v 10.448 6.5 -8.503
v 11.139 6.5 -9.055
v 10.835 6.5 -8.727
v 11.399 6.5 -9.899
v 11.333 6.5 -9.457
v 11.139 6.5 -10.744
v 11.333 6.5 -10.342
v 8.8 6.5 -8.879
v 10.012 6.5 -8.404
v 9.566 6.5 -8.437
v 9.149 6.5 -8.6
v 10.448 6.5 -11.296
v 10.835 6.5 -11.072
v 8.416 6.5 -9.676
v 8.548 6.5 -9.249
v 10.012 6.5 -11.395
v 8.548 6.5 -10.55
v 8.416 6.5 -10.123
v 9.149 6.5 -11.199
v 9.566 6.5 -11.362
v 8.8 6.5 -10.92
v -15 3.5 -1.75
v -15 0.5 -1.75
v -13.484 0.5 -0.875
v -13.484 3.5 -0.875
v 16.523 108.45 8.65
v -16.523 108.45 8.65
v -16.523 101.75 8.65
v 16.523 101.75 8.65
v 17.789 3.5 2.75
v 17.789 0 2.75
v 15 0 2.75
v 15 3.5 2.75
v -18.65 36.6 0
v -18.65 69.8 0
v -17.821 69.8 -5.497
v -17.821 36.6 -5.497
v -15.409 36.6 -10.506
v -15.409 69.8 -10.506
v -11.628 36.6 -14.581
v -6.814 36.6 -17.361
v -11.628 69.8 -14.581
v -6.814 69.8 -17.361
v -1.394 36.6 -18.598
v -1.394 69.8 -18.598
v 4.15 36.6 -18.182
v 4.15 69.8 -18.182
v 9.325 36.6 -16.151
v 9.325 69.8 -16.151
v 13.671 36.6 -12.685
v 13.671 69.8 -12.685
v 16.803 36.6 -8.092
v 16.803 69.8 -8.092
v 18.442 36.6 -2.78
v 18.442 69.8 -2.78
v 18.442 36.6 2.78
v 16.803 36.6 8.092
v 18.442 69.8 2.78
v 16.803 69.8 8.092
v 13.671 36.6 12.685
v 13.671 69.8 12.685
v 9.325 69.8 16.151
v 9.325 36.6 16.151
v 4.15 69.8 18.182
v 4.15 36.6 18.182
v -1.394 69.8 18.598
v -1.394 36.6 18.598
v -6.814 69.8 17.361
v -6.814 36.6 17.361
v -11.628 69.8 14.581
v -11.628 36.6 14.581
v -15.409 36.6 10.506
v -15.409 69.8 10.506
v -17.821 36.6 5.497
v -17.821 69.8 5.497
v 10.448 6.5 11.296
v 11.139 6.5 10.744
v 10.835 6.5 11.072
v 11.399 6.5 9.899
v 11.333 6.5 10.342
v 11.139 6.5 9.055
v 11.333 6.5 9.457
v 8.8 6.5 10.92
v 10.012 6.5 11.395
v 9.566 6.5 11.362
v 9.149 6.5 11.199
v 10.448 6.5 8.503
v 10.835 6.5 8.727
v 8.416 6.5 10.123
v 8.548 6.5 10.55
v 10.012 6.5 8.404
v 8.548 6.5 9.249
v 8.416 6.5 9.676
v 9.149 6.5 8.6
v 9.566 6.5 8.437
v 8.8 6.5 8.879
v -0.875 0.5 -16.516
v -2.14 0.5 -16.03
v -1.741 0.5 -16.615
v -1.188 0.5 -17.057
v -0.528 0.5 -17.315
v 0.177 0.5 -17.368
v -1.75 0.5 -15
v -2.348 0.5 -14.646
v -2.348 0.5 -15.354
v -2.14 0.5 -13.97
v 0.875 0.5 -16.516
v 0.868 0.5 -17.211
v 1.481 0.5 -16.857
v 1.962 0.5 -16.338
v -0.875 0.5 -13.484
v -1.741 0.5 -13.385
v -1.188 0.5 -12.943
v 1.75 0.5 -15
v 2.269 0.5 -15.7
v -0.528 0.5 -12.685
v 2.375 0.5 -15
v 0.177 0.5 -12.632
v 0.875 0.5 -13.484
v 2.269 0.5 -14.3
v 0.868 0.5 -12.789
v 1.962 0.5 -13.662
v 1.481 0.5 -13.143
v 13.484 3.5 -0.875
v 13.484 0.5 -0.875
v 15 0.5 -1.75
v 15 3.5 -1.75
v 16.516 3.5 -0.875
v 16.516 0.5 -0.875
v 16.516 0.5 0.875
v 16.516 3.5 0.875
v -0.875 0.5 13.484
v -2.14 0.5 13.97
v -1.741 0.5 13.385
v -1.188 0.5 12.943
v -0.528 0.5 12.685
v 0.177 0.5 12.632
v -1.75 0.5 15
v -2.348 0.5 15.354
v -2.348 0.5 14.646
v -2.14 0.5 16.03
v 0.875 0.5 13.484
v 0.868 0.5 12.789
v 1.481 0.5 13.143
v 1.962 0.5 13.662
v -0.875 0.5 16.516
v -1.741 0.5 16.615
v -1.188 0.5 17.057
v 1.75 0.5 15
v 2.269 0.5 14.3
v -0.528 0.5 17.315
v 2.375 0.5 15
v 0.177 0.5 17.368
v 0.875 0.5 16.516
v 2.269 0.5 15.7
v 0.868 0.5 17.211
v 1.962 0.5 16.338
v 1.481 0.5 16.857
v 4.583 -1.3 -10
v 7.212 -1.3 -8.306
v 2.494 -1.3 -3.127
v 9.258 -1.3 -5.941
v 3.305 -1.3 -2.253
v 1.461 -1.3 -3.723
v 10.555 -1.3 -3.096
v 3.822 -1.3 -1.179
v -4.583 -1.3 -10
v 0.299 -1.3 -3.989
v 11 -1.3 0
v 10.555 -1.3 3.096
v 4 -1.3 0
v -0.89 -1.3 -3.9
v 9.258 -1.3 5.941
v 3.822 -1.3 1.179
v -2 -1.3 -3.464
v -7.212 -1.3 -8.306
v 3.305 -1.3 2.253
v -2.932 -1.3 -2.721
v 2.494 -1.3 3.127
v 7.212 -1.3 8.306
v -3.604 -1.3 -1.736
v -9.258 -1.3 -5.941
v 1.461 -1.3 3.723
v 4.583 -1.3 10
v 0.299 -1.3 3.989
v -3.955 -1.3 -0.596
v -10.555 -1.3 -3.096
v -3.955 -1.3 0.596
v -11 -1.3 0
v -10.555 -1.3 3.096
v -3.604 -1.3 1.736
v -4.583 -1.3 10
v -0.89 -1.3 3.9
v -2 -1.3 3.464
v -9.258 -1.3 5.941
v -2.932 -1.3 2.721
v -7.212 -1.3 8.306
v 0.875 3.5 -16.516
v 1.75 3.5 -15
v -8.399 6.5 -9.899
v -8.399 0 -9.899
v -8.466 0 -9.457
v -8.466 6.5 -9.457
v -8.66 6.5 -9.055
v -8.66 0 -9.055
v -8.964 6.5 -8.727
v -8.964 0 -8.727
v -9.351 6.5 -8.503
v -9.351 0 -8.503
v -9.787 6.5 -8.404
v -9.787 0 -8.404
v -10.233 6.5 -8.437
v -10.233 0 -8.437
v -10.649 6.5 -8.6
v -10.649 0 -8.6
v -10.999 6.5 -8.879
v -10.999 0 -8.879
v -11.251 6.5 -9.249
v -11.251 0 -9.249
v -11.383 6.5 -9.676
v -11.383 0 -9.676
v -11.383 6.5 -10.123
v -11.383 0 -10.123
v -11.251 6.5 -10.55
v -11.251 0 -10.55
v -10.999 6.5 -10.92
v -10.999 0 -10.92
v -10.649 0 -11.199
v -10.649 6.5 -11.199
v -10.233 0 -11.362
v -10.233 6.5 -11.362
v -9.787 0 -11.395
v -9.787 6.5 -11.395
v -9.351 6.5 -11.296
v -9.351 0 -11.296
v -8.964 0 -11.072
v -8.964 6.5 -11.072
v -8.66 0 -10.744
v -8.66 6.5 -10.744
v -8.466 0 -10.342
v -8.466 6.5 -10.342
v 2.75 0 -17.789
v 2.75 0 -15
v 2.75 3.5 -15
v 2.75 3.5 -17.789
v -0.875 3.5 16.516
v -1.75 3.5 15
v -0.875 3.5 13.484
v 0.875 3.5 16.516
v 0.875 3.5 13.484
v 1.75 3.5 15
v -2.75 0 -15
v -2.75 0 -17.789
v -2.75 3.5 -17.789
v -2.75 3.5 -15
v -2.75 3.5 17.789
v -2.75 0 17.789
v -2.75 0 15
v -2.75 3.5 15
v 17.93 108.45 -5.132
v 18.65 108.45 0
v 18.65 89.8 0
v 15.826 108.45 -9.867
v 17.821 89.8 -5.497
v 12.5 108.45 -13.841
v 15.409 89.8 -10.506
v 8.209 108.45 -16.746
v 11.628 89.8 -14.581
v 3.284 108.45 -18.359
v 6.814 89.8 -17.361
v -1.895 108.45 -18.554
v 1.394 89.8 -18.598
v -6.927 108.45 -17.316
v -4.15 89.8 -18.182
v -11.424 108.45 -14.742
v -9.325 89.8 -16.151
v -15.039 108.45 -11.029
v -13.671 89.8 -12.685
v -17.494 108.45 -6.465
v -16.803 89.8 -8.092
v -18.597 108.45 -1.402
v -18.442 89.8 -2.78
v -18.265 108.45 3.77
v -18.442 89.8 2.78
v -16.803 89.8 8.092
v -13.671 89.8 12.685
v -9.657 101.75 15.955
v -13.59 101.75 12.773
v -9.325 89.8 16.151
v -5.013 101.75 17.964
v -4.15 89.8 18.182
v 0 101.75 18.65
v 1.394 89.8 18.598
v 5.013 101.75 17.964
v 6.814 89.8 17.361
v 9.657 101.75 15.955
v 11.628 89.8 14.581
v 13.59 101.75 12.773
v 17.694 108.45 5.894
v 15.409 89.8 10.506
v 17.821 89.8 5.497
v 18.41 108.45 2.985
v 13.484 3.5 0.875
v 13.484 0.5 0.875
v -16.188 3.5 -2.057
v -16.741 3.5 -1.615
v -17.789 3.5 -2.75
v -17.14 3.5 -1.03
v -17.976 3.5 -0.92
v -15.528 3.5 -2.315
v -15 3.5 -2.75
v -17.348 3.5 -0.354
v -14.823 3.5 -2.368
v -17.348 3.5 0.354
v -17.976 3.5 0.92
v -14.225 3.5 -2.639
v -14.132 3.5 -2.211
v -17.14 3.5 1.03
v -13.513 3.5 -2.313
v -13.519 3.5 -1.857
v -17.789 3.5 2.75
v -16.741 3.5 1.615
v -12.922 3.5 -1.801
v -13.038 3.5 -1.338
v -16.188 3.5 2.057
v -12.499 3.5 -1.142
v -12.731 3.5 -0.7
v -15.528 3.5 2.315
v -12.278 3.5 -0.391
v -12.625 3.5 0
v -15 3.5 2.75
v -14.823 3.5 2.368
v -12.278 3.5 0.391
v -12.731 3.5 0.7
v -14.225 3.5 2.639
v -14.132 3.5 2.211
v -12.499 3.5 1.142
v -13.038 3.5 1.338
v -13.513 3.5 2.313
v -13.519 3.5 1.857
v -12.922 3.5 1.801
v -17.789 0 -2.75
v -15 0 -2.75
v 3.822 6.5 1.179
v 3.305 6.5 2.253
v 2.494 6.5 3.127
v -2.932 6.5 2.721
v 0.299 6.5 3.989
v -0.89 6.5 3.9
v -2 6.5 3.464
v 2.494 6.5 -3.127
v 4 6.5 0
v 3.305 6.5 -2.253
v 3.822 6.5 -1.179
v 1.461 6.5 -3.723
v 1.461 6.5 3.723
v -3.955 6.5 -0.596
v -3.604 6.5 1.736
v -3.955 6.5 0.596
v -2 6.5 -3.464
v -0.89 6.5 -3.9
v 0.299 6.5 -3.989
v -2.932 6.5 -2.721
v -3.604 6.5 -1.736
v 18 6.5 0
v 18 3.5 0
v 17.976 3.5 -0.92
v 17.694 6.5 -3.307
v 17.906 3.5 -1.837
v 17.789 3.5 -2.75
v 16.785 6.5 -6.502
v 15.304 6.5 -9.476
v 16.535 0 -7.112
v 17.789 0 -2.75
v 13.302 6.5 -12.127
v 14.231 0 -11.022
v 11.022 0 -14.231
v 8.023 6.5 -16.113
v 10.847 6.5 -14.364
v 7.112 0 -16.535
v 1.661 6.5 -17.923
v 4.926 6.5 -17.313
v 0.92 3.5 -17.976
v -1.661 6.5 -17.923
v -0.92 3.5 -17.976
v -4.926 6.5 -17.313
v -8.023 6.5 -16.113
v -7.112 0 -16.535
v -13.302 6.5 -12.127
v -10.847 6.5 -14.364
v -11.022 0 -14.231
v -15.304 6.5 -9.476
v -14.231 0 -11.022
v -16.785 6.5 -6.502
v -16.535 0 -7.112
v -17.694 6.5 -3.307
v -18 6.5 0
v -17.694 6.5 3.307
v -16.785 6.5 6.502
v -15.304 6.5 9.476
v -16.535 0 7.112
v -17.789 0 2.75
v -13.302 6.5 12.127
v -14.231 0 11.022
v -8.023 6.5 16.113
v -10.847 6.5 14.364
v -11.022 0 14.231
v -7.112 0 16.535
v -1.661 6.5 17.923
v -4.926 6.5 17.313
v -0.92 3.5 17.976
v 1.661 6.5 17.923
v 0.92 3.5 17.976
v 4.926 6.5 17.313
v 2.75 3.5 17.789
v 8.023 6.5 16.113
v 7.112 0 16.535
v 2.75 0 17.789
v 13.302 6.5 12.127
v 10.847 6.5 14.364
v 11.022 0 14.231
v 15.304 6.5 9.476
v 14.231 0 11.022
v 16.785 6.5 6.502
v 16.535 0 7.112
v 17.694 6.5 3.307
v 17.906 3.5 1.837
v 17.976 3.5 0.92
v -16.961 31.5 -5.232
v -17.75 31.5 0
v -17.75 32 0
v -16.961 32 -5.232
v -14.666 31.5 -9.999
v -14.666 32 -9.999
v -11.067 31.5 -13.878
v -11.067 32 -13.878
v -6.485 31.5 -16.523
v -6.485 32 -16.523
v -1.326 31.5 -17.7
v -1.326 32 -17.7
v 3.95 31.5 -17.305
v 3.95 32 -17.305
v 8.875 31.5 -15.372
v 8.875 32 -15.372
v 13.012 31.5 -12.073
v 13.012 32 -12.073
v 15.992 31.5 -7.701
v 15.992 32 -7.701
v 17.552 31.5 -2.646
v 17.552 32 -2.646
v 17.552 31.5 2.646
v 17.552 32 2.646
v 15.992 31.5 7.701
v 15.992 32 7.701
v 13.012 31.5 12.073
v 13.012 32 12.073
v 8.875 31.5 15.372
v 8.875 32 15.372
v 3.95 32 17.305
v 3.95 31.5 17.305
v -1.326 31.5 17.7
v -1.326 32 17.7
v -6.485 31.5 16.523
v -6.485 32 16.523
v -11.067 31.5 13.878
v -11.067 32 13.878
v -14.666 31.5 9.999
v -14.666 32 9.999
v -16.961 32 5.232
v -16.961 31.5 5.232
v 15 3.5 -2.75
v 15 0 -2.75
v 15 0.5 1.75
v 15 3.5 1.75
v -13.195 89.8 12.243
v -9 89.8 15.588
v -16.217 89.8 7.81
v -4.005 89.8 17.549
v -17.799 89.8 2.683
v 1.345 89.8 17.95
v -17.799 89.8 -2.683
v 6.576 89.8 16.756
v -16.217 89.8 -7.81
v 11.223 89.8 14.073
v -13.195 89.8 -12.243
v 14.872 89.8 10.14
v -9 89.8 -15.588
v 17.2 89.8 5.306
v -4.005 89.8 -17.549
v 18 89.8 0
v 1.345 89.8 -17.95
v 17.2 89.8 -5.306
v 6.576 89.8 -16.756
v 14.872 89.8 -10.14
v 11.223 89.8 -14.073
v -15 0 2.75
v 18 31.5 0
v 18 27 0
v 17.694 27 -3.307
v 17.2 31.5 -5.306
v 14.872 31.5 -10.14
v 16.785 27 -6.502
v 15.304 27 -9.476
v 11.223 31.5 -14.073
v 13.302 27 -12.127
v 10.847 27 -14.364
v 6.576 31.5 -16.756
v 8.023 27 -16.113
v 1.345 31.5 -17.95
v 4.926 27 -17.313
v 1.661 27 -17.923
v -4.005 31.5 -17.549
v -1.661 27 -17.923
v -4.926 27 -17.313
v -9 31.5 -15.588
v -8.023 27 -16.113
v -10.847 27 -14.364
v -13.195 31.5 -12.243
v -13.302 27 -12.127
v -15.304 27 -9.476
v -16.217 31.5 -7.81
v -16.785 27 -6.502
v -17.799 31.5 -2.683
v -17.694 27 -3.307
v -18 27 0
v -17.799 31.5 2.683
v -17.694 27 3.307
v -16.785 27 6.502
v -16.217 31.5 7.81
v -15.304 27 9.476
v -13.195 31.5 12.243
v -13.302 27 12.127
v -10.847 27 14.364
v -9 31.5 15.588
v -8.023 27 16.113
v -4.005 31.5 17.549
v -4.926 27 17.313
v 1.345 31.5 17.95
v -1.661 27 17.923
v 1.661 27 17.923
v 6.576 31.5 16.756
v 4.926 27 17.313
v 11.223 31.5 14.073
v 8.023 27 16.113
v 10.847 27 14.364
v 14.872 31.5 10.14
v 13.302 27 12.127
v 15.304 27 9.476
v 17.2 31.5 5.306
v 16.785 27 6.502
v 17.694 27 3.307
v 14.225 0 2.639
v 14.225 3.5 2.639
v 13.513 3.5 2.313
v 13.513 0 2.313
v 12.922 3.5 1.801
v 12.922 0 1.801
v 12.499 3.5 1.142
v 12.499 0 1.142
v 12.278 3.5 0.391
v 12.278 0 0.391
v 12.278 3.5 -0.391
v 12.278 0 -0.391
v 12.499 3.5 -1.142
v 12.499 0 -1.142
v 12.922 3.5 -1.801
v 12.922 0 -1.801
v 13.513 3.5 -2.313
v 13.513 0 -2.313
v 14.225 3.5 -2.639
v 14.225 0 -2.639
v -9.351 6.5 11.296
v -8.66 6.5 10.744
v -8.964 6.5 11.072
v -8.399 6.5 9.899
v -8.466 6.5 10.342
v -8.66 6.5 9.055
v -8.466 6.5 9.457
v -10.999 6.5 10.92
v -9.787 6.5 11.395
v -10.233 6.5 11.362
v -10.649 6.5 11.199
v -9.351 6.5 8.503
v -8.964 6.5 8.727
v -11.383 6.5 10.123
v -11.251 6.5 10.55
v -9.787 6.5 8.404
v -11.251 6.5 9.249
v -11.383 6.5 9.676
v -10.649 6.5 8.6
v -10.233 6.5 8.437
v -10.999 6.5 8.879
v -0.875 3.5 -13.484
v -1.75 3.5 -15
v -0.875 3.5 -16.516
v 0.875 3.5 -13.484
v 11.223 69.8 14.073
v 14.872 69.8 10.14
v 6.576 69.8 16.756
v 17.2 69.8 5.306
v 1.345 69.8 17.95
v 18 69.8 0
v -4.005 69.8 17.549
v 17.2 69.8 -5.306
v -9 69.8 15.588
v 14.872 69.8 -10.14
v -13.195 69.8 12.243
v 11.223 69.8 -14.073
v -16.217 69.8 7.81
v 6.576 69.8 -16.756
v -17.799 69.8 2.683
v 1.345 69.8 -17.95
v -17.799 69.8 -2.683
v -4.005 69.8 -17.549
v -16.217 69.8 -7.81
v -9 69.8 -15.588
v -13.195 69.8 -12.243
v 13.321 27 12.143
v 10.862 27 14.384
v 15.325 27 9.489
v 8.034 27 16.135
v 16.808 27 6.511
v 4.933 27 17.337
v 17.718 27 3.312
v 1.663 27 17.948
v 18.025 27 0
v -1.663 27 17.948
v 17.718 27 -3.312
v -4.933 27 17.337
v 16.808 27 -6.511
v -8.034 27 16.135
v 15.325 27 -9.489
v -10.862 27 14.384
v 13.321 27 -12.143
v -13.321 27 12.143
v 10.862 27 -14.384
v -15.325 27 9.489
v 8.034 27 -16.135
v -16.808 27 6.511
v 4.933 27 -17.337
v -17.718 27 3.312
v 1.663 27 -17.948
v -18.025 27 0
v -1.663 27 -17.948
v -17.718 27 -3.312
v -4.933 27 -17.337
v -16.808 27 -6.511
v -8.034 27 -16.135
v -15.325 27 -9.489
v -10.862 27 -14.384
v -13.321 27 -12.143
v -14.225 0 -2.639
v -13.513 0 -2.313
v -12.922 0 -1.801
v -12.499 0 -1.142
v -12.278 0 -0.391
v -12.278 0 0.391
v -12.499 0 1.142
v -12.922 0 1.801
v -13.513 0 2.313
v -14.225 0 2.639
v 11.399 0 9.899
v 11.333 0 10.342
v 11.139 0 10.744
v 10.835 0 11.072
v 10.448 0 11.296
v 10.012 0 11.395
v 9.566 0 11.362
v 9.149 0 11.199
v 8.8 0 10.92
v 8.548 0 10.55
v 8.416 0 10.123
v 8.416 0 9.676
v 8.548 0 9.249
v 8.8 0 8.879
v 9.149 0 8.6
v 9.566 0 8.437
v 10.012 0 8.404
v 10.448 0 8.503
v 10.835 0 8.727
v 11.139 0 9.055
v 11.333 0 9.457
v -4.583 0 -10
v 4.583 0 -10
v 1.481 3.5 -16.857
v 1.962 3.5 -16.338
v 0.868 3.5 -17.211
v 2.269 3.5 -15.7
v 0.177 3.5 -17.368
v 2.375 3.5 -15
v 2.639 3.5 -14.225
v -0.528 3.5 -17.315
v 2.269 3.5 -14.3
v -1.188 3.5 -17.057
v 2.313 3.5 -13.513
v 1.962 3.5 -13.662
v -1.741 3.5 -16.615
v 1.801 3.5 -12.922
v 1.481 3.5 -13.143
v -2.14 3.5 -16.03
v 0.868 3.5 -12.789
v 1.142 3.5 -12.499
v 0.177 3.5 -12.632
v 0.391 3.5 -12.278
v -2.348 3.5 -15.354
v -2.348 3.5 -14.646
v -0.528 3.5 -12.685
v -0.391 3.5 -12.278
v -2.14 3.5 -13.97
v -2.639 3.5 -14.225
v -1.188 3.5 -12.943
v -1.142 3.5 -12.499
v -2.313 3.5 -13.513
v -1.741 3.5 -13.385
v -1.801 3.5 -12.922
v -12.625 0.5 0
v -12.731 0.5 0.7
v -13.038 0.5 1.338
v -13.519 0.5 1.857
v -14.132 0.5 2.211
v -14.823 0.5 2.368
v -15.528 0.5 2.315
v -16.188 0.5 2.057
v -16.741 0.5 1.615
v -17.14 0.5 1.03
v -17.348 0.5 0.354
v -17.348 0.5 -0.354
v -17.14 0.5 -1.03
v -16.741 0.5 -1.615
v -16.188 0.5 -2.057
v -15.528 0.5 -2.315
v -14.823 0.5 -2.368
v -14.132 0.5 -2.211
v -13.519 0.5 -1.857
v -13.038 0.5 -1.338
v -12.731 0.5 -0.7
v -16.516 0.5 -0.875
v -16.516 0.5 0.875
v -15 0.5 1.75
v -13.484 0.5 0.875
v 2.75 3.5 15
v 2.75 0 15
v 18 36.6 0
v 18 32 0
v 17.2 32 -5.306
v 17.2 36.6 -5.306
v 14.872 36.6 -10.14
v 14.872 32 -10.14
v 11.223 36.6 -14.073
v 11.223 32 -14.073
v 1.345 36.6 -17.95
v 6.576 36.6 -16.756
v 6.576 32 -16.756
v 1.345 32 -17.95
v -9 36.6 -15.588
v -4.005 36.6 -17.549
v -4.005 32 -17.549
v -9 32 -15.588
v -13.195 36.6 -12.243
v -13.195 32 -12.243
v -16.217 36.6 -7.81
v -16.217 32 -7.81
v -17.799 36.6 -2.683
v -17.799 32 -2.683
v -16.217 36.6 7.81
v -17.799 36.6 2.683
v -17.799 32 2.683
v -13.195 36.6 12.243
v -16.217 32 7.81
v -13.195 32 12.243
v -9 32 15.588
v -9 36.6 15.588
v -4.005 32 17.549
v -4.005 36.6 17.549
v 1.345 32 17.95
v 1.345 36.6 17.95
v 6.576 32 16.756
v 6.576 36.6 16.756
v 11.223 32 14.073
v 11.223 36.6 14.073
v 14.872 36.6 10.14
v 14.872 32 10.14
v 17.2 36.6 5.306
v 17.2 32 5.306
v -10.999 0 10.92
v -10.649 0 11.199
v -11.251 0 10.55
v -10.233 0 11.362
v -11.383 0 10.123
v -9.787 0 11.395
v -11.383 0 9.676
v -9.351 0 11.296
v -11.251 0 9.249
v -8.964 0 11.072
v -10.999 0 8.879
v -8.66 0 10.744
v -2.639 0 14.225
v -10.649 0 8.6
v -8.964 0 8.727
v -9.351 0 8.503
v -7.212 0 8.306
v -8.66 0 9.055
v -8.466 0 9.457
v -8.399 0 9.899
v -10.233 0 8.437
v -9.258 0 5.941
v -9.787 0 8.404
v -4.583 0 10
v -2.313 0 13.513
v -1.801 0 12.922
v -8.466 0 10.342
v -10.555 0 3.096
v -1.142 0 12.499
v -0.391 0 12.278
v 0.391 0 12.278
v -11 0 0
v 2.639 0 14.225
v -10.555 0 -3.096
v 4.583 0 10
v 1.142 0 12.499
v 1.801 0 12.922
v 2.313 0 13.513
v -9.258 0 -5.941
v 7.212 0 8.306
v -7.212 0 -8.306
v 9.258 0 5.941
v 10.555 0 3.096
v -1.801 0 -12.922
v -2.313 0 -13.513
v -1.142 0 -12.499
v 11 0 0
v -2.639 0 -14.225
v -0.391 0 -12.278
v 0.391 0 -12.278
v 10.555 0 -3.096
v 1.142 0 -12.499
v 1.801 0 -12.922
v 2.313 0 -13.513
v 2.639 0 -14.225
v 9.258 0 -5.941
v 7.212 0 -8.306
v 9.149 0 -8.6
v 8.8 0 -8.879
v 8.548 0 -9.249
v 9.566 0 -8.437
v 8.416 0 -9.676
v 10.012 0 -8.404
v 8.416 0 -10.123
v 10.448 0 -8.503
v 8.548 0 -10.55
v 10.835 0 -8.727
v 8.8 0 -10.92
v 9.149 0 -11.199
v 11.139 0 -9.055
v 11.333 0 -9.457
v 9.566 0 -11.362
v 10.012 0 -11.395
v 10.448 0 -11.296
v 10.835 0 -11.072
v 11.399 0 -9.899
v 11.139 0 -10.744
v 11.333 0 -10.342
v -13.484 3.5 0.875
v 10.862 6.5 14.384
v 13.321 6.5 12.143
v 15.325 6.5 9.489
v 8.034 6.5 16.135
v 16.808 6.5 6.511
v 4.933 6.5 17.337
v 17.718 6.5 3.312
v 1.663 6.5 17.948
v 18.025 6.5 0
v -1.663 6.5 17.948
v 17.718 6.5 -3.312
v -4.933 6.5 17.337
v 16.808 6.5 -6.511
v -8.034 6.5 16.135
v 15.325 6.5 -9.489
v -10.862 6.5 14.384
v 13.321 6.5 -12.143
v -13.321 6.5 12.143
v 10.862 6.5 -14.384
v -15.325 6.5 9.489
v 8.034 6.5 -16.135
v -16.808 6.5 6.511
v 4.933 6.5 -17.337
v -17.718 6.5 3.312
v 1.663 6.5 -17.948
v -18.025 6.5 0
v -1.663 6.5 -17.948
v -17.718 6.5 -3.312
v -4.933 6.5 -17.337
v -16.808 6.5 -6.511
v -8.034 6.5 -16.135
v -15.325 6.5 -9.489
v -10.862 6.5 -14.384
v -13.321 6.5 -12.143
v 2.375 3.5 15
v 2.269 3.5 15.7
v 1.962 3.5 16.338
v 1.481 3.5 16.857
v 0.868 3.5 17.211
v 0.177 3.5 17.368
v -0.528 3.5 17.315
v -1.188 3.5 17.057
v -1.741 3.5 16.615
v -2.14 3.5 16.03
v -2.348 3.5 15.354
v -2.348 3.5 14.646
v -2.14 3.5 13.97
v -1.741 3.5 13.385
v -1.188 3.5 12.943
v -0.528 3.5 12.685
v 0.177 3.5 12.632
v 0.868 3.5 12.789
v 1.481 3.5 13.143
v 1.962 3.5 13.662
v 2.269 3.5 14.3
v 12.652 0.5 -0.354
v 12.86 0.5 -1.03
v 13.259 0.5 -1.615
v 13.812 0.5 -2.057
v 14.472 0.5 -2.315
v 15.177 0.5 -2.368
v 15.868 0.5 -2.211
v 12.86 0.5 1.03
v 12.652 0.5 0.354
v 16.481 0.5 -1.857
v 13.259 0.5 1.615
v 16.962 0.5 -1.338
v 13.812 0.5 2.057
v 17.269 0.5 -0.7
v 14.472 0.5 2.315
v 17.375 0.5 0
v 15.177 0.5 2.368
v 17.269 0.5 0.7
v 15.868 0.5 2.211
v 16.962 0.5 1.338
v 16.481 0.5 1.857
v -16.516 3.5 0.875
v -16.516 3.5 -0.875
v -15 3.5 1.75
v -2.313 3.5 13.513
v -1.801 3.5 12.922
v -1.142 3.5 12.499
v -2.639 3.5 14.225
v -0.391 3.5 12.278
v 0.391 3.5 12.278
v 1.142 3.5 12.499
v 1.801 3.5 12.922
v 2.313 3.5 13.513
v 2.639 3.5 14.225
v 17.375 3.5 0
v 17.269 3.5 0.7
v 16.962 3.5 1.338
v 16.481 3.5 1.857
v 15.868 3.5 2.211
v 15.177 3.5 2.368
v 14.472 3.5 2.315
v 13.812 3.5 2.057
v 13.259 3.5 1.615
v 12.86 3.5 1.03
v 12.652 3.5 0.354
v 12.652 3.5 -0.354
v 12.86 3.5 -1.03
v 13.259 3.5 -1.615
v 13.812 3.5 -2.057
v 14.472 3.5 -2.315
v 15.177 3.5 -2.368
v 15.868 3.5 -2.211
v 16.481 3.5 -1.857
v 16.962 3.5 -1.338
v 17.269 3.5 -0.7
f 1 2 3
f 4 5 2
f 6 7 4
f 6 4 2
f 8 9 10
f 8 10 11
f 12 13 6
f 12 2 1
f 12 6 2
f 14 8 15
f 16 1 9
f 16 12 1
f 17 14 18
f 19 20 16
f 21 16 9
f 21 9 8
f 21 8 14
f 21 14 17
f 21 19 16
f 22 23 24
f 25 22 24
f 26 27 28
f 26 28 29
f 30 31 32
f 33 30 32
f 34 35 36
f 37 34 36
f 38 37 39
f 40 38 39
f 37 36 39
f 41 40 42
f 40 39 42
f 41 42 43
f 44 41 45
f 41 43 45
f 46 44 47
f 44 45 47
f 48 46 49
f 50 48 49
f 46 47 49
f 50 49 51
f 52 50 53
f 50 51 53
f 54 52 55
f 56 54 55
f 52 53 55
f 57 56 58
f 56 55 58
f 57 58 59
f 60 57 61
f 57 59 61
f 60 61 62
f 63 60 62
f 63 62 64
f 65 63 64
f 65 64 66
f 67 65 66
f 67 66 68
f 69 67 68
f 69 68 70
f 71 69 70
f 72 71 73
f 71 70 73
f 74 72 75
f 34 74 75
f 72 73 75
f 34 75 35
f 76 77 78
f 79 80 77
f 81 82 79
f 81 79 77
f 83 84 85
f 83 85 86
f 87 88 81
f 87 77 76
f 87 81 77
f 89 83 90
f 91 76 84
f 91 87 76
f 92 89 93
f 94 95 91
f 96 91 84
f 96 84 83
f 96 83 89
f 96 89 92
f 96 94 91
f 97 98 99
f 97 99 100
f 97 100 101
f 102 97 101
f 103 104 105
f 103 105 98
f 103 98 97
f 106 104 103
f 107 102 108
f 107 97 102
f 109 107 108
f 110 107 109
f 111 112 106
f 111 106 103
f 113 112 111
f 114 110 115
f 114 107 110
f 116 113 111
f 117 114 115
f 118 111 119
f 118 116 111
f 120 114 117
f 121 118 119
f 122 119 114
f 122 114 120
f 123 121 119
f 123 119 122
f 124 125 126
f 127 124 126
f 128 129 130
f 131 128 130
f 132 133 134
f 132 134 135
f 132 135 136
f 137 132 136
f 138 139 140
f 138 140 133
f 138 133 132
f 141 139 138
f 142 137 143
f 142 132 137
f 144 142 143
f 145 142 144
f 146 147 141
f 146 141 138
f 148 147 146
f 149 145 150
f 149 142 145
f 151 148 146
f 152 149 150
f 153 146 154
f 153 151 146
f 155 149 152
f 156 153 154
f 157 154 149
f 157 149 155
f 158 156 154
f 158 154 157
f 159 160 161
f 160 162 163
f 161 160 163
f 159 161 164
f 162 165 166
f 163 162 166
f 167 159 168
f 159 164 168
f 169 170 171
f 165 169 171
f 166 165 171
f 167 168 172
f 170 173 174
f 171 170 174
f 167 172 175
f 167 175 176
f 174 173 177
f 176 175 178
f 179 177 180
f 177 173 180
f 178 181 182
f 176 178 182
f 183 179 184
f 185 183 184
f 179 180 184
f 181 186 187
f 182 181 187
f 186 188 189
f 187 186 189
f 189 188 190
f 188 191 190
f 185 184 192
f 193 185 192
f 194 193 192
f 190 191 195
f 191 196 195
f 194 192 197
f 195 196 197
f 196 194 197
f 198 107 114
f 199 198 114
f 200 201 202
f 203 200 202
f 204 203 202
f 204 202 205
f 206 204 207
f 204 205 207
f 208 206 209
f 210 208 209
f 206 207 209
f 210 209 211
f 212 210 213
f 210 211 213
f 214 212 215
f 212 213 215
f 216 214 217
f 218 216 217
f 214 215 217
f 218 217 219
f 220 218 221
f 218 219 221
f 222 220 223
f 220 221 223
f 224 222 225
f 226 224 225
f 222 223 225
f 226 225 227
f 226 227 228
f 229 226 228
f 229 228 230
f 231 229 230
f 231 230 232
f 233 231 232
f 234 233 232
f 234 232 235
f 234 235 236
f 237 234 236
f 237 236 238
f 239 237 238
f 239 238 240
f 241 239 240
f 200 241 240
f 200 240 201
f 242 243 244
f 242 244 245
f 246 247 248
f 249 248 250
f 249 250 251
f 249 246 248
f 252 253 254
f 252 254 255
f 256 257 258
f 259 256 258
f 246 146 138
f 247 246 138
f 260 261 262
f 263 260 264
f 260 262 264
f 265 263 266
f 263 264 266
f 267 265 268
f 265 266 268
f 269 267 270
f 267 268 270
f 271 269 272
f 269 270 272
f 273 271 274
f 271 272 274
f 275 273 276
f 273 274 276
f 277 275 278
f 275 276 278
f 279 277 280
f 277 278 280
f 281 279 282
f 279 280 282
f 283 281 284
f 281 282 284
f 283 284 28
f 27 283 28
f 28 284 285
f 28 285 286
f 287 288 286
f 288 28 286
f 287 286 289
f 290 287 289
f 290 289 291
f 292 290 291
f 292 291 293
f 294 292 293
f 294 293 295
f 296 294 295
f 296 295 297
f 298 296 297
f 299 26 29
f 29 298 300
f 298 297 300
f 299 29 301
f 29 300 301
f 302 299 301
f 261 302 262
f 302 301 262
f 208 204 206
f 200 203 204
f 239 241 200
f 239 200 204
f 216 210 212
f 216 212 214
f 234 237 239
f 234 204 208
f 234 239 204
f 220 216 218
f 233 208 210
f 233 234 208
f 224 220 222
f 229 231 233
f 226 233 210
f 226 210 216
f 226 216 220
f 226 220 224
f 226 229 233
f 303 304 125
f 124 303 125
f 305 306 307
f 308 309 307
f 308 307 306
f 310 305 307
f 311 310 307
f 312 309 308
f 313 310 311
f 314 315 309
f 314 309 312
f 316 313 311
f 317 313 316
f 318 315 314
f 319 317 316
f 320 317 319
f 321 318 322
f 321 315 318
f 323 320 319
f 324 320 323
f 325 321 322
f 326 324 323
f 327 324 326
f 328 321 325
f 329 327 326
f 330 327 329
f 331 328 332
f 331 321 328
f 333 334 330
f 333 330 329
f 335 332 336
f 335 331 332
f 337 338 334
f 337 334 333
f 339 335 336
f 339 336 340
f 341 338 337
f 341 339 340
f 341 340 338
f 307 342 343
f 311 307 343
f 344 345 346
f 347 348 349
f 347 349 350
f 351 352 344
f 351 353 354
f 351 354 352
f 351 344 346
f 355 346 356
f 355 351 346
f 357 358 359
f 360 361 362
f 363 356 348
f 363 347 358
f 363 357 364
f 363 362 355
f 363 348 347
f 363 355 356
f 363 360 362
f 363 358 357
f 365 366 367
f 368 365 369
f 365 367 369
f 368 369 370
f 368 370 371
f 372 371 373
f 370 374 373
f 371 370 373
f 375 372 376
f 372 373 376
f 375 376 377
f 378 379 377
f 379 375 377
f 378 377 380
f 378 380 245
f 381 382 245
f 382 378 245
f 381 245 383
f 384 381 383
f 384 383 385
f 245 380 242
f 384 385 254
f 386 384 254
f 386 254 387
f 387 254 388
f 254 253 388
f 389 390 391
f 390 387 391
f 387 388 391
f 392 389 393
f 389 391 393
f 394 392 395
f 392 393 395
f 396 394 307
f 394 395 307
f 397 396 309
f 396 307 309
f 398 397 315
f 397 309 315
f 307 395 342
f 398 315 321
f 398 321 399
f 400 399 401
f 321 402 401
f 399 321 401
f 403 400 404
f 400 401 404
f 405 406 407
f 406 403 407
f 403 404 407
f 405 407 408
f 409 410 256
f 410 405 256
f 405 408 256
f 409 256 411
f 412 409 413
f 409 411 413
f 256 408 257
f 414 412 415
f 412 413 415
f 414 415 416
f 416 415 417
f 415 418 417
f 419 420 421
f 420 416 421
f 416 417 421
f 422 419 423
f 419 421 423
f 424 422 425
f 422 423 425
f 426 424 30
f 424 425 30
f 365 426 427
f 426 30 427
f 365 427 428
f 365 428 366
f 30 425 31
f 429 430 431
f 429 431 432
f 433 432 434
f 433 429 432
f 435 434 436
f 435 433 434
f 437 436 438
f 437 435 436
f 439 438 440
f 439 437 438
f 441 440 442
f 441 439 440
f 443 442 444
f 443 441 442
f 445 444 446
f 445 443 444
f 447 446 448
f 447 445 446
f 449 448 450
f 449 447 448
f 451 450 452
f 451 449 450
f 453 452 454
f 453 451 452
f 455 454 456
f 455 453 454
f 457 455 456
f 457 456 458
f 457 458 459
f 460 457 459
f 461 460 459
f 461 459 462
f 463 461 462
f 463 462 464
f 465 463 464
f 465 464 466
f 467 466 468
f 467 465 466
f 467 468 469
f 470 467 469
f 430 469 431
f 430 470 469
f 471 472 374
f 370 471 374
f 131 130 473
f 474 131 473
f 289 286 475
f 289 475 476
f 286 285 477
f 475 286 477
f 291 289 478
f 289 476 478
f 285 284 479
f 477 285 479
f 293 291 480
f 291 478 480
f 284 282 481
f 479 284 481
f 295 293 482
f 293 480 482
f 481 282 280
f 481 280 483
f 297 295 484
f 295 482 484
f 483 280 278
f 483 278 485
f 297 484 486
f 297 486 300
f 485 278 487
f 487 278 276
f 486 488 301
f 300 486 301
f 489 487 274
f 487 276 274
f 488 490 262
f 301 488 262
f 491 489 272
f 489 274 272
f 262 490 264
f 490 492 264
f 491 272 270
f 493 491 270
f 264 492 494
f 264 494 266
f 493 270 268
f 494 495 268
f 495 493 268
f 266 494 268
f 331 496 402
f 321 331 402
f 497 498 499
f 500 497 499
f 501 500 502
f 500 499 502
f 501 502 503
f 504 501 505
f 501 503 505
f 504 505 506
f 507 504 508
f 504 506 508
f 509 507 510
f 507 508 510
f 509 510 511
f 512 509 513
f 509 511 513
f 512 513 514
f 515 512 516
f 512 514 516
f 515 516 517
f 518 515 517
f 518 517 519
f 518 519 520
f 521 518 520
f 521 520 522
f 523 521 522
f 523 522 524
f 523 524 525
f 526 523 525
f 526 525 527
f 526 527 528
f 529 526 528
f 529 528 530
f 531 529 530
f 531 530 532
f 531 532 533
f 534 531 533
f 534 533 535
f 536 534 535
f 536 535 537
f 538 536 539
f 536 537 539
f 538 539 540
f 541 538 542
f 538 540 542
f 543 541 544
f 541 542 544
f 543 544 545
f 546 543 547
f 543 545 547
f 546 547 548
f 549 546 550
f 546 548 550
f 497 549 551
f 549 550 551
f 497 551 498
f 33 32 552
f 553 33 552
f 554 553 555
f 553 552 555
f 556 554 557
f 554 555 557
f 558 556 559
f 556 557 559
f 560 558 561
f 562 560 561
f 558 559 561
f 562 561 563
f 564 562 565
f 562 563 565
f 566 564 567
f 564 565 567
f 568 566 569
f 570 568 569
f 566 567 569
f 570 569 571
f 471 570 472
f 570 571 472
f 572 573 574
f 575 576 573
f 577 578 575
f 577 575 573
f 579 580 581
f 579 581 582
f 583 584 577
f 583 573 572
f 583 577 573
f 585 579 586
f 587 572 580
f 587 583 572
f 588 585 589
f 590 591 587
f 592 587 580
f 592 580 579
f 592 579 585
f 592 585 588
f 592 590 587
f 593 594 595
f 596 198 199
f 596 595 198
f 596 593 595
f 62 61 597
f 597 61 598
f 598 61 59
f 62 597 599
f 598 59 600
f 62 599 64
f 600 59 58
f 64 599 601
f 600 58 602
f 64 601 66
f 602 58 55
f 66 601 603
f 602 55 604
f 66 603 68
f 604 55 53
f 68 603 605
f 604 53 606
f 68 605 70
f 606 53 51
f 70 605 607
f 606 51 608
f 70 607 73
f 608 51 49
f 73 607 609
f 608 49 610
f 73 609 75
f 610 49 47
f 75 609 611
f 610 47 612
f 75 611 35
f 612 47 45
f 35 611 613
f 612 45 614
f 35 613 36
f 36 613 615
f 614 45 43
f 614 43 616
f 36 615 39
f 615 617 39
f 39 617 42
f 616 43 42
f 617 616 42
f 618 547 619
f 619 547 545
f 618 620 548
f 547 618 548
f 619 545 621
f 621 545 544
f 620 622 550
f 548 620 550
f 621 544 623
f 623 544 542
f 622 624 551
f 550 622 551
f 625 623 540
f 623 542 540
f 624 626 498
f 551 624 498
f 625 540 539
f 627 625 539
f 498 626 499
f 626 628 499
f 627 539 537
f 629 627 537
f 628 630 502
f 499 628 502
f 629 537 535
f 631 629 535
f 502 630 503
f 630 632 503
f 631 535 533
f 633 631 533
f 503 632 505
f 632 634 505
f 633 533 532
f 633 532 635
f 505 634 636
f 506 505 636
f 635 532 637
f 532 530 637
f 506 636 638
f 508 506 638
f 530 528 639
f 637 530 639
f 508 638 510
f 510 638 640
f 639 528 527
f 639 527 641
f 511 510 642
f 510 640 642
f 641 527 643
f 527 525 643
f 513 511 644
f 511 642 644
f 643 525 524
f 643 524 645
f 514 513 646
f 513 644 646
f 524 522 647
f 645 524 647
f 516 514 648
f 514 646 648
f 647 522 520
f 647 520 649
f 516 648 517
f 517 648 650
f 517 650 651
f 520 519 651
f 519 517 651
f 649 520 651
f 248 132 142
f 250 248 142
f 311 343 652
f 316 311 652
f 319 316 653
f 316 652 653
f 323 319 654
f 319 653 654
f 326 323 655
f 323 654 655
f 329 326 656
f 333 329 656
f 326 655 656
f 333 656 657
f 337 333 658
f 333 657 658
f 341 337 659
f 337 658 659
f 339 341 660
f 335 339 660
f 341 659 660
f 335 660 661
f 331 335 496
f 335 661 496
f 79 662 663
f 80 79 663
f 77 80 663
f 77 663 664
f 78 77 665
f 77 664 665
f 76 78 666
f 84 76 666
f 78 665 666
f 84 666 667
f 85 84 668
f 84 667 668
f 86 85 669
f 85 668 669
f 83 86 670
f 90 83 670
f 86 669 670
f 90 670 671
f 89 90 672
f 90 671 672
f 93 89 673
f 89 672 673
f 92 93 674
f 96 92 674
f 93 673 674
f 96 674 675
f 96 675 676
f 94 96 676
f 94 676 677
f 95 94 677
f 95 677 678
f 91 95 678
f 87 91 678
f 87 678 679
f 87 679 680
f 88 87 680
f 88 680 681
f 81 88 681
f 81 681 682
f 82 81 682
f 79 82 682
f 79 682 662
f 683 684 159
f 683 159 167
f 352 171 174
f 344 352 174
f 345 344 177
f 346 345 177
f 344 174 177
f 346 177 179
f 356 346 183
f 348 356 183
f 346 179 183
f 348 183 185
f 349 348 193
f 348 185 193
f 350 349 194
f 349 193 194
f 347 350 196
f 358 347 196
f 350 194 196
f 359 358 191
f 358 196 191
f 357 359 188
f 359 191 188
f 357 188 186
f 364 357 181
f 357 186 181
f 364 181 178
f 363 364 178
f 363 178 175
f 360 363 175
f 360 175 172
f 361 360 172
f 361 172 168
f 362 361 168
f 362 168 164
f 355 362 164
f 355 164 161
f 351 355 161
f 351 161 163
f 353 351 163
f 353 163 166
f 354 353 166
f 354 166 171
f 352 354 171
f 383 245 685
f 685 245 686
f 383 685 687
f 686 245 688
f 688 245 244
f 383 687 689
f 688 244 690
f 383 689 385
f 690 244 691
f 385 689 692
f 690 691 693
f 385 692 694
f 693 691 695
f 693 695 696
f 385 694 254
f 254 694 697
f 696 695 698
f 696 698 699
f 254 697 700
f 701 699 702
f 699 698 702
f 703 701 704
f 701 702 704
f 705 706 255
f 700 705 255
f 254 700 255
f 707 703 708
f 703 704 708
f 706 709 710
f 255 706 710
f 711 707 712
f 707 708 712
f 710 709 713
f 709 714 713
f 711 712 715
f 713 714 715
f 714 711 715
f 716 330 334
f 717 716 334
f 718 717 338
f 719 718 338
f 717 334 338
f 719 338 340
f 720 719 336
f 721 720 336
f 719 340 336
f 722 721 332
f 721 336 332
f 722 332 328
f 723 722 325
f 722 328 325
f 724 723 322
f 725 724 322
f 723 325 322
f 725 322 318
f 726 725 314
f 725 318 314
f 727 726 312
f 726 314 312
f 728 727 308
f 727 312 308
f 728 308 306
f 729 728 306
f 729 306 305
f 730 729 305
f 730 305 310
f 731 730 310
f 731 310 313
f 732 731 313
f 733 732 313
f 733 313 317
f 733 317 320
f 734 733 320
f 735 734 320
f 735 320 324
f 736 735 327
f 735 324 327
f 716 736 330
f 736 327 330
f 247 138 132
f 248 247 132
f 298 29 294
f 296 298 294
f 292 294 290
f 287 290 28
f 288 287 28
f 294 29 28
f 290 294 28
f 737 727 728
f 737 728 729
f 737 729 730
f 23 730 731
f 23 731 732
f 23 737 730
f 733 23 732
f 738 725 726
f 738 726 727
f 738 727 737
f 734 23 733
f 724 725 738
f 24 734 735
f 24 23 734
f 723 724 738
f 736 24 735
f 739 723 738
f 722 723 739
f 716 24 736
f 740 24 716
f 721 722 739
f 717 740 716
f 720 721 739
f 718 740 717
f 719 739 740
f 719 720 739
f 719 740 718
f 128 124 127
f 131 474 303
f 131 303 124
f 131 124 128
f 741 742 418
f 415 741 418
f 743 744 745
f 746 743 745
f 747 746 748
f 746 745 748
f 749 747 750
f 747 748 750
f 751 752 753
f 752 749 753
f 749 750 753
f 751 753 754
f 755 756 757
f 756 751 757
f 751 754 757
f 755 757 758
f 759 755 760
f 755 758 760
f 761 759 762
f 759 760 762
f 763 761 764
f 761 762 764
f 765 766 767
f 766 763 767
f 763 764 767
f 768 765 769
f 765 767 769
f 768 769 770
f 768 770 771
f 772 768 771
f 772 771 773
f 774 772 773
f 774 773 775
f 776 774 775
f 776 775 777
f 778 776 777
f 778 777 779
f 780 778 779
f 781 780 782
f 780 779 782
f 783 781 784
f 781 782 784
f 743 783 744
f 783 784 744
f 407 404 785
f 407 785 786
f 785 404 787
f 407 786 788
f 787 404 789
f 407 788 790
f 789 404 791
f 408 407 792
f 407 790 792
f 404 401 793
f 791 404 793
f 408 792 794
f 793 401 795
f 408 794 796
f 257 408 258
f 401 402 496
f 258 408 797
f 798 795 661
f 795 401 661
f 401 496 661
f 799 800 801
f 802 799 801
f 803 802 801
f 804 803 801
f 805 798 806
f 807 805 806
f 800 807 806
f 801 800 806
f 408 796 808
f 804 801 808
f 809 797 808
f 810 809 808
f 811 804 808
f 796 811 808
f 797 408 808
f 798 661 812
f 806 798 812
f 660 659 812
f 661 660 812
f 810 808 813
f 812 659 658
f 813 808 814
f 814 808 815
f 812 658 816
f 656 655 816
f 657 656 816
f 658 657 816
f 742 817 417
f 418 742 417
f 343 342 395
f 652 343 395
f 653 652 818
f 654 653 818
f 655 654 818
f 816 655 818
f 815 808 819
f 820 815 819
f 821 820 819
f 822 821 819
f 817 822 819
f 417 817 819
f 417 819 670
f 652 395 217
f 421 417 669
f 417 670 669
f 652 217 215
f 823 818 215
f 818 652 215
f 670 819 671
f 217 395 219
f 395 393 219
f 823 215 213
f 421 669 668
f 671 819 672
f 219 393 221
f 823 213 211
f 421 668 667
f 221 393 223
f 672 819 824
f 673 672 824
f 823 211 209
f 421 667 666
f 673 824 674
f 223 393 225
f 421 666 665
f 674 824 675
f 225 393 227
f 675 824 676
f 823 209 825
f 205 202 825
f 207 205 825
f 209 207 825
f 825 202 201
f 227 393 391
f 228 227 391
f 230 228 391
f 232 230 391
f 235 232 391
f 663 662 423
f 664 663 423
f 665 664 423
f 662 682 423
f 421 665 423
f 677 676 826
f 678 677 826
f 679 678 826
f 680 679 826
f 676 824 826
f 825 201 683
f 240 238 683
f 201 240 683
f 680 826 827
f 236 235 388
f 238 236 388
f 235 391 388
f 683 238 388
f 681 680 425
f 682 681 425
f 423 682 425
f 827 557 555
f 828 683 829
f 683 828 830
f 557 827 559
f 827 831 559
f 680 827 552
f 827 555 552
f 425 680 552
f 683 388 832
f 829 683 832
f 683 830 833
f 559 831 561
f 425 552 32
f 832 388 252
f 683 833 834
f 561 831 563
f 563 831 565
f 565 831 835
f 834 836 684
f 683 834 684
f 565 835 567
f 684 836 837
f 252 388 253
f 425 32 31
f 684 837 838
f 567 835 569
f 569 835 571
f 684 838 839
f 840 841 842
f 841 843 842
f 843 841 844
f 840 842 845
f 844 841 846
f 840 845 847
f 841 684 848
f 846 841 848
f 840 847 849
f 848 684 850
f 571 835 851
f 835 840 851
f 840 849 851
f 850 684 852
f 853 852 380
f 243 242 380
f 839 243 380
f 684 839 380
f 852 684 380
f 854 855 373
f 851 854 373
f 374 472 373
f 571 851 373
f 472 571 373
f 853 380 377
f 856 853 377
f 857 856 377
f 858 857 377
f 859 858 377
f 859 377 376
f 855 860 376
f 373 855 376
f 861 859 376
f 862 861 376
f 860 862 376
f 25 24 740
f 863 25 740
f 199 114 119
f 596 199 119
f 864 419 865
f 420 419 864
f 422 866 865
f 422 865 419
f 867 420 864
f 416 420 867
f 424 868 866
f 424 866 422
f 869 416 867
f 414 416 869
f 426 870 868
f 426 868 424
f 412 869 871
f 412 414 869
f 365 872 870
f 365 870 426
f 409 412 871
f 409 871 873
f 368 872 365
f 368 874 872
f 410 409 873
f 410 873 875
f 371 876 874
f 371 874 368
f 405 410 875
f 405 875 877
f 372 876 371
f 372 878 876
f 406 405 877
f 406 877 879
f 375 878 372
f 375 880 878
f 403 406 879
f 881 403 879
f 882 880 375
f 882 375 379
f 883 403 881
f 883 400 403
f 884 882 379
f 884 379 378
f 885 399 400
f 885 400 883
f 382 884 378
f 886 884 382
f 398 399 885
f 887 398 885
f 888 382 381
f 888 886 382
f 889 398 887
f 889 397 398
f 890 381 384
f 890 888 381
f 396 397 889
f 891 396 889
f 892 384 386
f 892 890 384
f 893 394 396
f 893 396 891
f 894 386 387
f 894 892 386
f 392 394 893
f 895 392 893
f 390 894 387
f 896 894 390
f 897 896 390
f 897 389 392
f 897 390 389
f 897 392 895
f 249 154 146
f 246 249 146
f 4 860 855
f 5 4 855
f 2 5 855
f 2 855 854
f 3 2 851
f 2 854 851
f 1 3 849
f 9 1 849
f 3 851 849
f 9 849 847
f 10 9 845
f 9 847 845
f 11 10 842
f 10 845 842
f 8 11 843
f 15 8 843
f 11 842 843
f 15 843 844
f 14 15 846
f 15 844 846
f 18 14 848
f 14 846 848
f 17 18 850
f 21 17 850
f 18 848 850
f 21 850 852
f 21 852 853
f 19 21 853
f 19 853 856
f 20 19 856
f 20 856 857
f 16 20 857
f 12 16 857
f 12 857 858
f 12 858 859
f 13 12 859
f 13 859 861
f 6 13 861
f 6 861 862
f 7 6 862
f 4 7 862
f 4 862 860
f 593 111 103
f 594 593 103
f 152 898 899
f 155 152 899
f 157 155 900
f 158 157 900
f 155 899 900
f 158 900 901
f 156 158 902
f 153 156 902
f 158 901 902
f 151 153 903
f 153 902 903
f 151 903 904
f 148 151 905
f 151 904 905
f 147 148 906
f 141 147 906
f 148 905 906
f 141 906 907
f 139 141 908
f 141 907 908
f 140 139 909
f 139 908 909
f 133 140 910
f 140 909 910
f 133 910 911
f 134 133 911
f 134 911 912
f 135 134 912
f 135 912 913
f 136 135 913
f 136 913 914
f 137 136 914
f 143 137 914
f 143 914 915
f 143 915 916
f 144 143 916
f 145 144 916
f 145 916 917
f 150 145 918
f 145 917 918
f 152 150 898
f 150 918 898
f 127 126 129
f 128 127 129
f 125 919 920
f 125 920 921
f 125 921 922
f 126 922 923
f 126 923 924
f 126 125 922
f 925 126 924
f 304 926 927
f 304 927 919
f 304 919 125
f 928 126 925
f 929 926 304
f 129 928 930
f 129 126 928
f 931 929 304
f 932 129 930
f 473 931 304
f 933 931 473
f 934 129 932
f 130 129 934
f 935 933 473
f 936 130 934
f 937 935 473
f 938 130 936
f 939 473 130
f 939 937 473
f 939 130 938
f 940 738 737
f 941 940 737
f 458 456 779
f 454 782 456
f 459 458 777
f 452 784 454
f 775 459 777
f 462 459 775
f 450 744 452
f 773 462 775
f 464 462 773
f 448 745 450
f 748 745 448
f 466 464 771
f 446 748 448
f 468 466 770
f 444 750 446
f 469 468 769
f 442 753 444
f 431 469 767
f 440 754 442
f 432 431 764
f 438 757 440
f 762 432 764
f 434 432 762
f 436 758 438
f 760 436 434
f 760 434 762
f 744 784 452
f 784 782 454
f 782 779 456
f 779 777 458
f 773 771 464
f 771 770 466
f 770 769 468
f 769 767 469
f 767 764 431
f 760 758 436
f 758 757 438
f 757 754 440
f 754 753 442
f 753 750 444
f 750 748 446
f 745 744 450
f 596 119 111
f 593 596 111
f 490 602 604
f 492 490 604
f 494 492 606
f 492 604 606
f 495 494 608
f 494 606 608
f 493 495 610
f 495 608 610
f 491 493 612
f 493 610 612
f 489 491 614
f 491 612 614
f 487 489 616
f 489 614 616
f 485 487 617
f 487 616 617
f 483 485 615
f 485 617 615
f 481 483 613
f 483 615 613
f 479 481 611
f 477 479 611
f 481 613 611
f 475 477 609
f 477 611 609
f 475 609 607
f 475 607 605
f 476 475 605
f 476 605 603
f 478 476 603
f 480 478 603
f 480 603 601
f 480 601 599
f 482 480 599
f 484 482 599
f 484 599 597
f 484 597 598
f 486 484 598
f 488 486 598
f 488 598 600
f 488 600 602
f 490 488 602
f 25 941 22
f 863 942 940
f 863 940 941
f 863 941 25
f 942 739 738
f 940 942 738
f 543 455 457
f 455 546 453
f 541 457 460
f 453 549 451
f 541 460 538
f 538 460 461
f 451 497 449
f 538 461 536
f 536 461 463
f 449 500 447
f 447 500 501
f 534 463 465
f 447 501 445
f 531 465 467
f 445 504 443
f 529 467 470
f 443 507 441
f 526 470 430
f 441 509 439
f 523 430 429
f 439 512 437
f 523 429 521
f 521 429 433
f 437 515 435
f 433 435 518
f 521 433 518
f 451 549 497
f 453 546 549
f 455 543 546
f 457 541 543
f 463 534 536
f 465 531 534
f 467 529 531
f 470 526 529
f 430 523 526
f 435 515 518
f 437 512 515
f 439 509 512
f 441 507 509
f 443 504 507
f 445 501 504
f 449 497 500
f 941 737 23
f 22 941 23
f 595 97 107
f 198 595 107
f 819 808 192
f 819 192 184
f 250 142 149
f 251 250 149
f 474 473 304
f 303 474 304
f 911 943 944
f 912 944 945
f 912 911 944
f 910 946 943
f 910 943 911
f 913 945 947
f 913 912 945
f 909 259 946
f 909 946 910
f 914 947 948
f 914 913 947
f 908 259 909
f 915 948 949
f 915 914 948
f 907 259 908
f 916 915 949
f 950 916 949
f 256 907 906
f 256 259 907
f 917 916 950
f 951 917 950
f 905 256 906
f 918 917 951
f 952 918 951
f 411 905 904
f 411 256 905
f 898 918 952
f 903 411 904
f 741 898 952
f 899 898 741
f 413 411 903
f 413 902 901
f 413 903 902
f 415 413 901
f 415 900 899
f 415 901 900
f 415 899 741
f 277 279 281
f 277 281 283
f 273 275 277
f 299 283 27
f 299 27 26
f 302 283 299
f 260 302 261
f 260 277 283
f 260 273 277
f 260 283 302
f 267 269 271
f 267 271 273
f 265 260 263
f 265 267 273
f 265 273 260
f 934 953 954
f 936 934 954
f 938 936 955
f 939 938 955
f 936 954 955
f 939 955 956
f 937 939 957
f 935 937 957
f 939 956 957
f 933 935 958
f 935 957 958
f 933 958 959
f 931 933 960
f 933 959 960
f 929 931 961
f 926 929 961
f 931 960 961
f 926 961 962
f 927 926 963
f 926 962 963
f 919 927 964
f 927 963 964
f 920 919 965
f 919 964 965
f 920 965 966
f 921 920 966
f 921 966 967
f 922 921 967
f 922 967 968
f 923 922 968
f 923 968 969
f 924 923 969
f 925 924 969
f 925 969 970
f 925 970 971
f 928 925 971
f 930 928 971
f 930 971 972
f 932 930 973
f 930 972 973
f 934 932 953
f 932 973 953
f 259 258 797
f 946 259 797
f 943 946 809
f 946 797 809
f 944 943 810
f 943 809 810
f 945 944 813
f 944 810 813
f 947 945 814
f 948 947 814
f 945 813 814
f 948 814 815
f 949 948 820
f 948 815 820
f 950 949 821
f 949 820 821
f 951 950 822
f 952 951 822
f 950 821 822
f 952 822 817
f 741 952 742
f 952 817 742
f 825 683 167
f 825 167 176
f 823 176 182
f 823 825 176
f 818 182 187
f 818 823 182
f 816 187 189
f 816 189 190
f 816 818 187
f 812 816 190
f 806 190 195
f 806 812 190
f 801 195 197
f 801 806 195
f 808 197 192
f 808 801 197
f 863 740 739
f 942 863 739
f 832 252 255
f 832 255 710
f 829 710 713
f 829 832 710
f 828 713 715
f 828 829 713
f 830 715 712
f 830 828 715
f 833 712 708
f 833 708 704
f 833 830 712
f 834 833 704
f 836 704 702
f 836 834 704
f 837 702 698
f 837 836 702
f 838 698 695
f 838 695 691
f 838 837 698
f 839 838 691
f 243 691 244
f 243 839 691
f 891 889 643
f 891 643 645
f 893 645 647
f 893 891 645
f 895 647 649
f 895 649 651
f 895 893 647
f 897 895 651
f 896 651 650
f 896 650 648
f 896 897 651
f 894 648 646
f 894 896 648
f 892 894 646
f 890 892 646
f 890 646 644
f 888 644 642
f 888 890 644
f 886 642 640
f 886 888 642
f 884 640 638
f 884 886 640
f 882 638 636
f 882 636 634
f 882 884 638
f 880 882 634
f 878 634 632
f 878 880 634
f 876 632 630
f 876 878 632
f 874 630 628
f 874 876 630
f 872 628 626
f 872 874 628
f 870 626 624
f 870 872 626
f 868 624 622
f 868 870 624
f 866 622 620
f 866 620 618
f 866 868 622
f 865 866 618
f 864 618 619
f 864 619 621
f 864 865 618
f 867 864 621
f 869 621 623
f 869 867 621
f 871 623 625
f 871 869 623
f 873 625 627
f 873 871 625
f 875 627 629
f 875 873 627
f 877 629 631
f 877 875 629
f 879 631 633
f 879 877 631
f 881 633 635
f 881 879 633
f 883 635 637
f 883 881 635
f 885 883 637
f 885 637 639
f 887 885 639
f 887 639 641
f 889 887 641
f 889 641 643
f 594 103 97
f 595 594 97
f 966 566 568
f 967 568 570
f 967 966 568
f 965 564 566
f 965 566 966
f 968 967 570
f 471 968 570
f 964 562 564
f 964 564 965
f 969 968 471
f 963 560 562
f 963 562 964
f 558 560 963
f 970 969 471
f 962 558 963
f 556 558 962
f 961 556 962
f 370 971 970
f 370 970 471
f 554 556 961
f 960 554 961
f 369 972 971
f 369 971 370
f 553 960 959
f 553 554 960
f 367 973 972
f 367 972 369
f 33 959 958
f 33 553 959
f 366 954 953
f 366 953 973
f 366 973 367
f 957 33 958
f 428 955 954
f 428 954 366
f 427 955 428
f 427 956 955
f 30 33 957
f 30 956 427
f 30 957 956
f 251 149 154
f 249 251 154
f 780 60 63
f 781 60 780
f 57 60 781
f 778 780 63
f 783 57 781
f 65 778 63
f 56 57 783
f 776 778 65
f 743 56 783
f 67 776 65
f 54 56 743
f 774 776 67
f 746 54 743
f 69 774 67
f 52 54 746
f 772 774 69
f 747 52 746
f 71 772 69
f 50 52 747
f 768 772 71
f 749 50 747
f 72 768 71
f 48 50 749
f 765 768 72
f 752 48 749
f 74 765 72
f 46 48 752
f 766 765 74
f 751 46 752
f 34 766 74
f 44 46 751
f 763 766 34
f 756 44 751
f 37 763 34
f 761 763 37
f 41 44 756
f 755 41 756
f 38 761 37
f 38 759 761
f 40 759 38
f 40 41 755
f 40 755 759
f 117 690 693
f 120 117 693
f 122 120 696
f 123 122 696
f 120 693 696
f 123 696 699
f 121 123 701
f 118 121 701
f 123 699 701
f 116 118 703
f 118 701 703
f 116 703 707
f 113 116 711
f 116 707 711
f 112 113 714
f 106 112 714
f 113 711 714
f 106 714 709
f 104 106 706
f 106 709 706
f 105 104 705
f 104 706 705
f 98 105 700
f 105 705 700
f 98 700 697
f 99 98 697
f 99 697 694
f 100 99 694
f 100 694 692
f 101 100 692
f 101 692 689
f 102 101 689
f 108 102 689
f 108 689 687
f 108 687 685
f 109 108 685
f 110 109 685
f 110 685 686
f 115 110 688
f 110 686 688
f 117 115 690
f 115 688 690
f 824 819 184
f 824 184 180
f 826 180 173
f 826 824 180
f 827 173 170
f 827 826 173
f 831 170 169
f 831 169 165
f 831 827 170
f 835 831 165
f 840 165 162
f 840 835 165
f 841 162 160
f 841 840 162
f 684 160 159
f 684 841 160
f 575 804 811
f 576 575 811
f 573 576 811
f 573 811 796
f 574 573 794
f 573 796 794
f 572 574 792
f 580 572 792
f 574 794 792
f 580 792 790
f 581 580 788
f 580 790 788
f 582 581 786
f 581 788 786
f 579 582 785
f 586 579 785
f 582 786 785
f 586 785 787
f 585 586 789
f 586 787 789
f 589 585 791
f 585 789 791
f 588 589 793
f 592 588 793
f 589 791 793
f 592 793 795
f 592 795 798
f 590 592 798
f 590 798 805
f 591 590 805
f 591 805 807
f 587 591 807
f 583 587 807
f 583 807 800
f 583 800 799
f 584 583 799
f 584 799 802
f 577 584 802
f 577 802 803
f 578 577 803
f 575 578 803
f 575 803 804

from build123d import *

# Parameters (mm, degrees)
SKETCH1_R           = 18
BOSS_EXTRUDE1_DEPTH = 89.8
SKETCH2_R           = 18.65
BOSS_EXTRUDE2_DEPTH = 18.65
BOSS_EXTRUDE4_DEPTH = 1.3
SKETCH3_R           = 18.65
BOSS_EXTRUDE3_DEPTH = 33.2
SKETCH11_R          = 4
CUT_EXTRUDE1_DEPTH  = 10.3
CUT_EXTRUDE2_DEPTH  = 6.7
SKETCH14_R          = 1.5
CUT_EXTRUDE3_DEPTH  = 10
SKETCH16_R          = 18.025
BOSS_EXTRUDE5_DEPTH = 20.5
SKETCH17_R          = 19.645678417
SKETCH17_R_2        = 17.75
CUT_EXTRUDE5_DEPTH  = 0.5
CUT_EXTRUDE6_DEPTH  = 3.5
SKETCH19_R          = 2.375
BOSS_EXTRUDE6_DEPTH = 3
CUT_EXTRUDE7_DEPTH  = 3


with BuildPart() as part:
    # Sketch1 → Boss-Extrude1 (new body)
    with BuildSketch(Plane(origin=(0, 0, 0), x_dir=(1, 0, 0), z_dir=(0, 1, 0))):
        Circle(SKETCH1_R)
    extrude(amount=BOSS_EXTRUDE1_DEPTH)

    # Sketch2 → Boss-Extrude2 (add)
    with BuildSketch(Plane(origin=(0, 89.8, 0), x_dir=(1, 0, 0), z_dir=(0, 1, 0))):
        Circle(SKETCH2_R)
    extrude(amount=BOSS_EXTRUDE2_DEPTH)

    # Sketch9 → Boss-Extrude4 (add)
    with BuildSketch(Plane.XZ):
        with BuildLine():
            Line((4.582575695, -10), (-4.582575695, -10))
            ThreePointArc((-4.582575695, -10), (-11, 0), (-4.582575695, 10))
            Line((-4.582575695, 10), (4.582575695, 10))
            ThreePointArc((4.582575695, 10), (11, 0), (4.582575695, -10))
        make_face()
    extrude(amount=BOSS_EXTRUDE4_DEPTH)

    # Sketch3 → Boss-Extrude3 (add)
    with BuildSketch(Plane(origin=(0, 69.8, 0), x_dir=(-1, 0, 0), z_dir=(0, -1, 0))):
        Circle(SKETCH3_R)
    extrude(amount=BOSS_EXTRUDE3_DEPTH)

    # Sketch11 → Cut-Extrude1 (cut)
    with BuildSketch(Plane.XZ.offset(1.3)):
        Circle(SKETCH11_R)
    extrude(amount=-CUT_EXTRUDE1_DEPTH, mode=Mode.SUBTRACT)

    # Sketch13 → Cut-Extrude2 (cut)
    with BuildSketch(Plane(origin=(0, 108.45, 0), x_dir=(1, 0, 0), z_dir=(0, 1, 0))):
        with BuildLine():
            Line((-16.522711642, -8.65), (16.522711642, -8.65))
            ThreePointArc((16.522711642, -8.65), (0, -18.65), (-16.522711642, -8.65))
        make_face()
    extrude(amount=-CUT_EXTRUDE2_DEPTH, mode=Mode.SUBTRACT)

    # Sketch14 → Cut-Extrude3 (cut)
    with BuildSketch(Plane.XZ):
        with Locations((-9.899494937, 9.899494937)):
            Circle(SKETCH14_R)
        with Locations((9.899494937, 9.899494937)):
            Circle(SKETCH14_R)
        with Locations((9.899494937, -9.899494937)):
            Circle(SKETCH14_R)
        with Locations((-9.899494937, -9.899494937)):
            Circle(SKETCH14_R)
    extrude(amount=-CUT_EXTRUDE3_DEPTH, mode=Mode.SUBTRACT)

    # Sketch16 → Boss-Extrude5 (add)
    with BuildSketch(Plane(origin=(0, 6.5, 0), x_dir=(-1, 0, 0), z_dir=(0, -1, 0))):
        Circle(SKETCH16_R)
    extrude(amount=-BOSS_EXTRUDE5_DEPTH)

    # Sketch17 → Cut-Extrude5 (cut)
    with BuildSketch(Plane(origin=(0, 31.5, 0), x_dir=(-1, 0, 0), z_dir=(0, -1, 0))):
        Circle(SKETCH17_R)
        Circle(SKETCH17_R_2, mode=Mode.SUBTRACT)
    extrude(amount=-CUT_EXTRUDE5_DEPTH, mode=Mode.SUBTRACT)

    # Sketch18 → Cut-Extrude6 (cut)
    with BuildSketch(Plane.XZ):
        with BuildLine():
            Line((2.75, -15), (2.75, -20))
            Line((2.75, -20), (-2.75, -20))
            Line((-2.75, -20), (-2.75, -15))
            ThreePointArc((-2.75, -15), (0, -12.25), (2.75, -15))
        make_face()
        with BuildLine():
            Line((2.75, 15), (2.75, 20))
            Line((2.75, 20), (-2.75, 20))
            Line((-2.75, 20), (-2.75, 15))
            ThreePointArc((-2.75, 15), (0, 12.25), (2.75, 15))
        make_face()
        with BuildLine():
            Line((-15, 2.75), (-20, 2.75))
            Line((-20, 2.75), (-20, -2.75))
            Line((-20, -2.75), (-15, -2.75))
            ThreePointArc((-15, -2.75), (-12.25, 0), (-15, 2.75))
        make_face()
        with BuildLine():
            Line((15, -2.75), (20, -2.75))
            Line((20, -2.75), (20, 2.75))
            Line((20, 2.75), (15, 2.75))
            ThreePointArc((15, 2.75), (12.25, 0), (15, -2.75))
        make_face()
    extrude(amount=-CUT_EXTRUDE6_DEPTH, mode=Mode.SUBTRACT)

    # Sketch19 → Boss-Extrude6 (add)
    with BuildSketch(Plane.XZ.offset(-3.5)):
        with Locations((-15, 0)):
            Circle(SKETCH19_R)
        with Locations((0, 15)):
            Circle(SKETCH19_R)
        with Locations((15, 0)):
            Circle(SKETCH19_R)
        with Locations((0, -15)):
            Circle(SKETCH19_R)
    extrude(amount=BOSS_EXTRUDE6_DEPTH)

    # Sketch20 → Cut-Extrude7 (cut)
    with BuildSketch(Plane.XZ.offset(-0.5)):
        Polygon((16.515813069, 0.875155083), (15, 1.750310167), (13.484186931, 0.875155083), (13.484186931, -0.875155083), (15, -1.750310167), (16.515813069, -0.875155083), align=None)
        Polygon((-1.750310167, 15), (-0.875155083, 13.484186931), (0.875155083, 13.484186931), (1.750310167, 15), (0.875155083, 16.515813069), (-0.875155083, 16.515813069), align=None)
        Polygon((0.875155083, -16.515813069), (1.750310167, -15), (0.875155083, -13.484186931), (-0.875155083, -13.484186931), (-1.750310167, -15), (-0.875155083, -16.515813069), align=None)
        Polygon((-16.515813069, -0.875155083), (-15, -1.750310167), (-13.484186931, -0.875155083), (-13.484186931, 0.875155083), (-15, 1.750310167), (-16.515813069, 0.875155083), align=None)
    extrude(amount=-CUT_EXTRUDE7_DEPTH, mode=Mode.SUBTRACT)


solid = part.part
